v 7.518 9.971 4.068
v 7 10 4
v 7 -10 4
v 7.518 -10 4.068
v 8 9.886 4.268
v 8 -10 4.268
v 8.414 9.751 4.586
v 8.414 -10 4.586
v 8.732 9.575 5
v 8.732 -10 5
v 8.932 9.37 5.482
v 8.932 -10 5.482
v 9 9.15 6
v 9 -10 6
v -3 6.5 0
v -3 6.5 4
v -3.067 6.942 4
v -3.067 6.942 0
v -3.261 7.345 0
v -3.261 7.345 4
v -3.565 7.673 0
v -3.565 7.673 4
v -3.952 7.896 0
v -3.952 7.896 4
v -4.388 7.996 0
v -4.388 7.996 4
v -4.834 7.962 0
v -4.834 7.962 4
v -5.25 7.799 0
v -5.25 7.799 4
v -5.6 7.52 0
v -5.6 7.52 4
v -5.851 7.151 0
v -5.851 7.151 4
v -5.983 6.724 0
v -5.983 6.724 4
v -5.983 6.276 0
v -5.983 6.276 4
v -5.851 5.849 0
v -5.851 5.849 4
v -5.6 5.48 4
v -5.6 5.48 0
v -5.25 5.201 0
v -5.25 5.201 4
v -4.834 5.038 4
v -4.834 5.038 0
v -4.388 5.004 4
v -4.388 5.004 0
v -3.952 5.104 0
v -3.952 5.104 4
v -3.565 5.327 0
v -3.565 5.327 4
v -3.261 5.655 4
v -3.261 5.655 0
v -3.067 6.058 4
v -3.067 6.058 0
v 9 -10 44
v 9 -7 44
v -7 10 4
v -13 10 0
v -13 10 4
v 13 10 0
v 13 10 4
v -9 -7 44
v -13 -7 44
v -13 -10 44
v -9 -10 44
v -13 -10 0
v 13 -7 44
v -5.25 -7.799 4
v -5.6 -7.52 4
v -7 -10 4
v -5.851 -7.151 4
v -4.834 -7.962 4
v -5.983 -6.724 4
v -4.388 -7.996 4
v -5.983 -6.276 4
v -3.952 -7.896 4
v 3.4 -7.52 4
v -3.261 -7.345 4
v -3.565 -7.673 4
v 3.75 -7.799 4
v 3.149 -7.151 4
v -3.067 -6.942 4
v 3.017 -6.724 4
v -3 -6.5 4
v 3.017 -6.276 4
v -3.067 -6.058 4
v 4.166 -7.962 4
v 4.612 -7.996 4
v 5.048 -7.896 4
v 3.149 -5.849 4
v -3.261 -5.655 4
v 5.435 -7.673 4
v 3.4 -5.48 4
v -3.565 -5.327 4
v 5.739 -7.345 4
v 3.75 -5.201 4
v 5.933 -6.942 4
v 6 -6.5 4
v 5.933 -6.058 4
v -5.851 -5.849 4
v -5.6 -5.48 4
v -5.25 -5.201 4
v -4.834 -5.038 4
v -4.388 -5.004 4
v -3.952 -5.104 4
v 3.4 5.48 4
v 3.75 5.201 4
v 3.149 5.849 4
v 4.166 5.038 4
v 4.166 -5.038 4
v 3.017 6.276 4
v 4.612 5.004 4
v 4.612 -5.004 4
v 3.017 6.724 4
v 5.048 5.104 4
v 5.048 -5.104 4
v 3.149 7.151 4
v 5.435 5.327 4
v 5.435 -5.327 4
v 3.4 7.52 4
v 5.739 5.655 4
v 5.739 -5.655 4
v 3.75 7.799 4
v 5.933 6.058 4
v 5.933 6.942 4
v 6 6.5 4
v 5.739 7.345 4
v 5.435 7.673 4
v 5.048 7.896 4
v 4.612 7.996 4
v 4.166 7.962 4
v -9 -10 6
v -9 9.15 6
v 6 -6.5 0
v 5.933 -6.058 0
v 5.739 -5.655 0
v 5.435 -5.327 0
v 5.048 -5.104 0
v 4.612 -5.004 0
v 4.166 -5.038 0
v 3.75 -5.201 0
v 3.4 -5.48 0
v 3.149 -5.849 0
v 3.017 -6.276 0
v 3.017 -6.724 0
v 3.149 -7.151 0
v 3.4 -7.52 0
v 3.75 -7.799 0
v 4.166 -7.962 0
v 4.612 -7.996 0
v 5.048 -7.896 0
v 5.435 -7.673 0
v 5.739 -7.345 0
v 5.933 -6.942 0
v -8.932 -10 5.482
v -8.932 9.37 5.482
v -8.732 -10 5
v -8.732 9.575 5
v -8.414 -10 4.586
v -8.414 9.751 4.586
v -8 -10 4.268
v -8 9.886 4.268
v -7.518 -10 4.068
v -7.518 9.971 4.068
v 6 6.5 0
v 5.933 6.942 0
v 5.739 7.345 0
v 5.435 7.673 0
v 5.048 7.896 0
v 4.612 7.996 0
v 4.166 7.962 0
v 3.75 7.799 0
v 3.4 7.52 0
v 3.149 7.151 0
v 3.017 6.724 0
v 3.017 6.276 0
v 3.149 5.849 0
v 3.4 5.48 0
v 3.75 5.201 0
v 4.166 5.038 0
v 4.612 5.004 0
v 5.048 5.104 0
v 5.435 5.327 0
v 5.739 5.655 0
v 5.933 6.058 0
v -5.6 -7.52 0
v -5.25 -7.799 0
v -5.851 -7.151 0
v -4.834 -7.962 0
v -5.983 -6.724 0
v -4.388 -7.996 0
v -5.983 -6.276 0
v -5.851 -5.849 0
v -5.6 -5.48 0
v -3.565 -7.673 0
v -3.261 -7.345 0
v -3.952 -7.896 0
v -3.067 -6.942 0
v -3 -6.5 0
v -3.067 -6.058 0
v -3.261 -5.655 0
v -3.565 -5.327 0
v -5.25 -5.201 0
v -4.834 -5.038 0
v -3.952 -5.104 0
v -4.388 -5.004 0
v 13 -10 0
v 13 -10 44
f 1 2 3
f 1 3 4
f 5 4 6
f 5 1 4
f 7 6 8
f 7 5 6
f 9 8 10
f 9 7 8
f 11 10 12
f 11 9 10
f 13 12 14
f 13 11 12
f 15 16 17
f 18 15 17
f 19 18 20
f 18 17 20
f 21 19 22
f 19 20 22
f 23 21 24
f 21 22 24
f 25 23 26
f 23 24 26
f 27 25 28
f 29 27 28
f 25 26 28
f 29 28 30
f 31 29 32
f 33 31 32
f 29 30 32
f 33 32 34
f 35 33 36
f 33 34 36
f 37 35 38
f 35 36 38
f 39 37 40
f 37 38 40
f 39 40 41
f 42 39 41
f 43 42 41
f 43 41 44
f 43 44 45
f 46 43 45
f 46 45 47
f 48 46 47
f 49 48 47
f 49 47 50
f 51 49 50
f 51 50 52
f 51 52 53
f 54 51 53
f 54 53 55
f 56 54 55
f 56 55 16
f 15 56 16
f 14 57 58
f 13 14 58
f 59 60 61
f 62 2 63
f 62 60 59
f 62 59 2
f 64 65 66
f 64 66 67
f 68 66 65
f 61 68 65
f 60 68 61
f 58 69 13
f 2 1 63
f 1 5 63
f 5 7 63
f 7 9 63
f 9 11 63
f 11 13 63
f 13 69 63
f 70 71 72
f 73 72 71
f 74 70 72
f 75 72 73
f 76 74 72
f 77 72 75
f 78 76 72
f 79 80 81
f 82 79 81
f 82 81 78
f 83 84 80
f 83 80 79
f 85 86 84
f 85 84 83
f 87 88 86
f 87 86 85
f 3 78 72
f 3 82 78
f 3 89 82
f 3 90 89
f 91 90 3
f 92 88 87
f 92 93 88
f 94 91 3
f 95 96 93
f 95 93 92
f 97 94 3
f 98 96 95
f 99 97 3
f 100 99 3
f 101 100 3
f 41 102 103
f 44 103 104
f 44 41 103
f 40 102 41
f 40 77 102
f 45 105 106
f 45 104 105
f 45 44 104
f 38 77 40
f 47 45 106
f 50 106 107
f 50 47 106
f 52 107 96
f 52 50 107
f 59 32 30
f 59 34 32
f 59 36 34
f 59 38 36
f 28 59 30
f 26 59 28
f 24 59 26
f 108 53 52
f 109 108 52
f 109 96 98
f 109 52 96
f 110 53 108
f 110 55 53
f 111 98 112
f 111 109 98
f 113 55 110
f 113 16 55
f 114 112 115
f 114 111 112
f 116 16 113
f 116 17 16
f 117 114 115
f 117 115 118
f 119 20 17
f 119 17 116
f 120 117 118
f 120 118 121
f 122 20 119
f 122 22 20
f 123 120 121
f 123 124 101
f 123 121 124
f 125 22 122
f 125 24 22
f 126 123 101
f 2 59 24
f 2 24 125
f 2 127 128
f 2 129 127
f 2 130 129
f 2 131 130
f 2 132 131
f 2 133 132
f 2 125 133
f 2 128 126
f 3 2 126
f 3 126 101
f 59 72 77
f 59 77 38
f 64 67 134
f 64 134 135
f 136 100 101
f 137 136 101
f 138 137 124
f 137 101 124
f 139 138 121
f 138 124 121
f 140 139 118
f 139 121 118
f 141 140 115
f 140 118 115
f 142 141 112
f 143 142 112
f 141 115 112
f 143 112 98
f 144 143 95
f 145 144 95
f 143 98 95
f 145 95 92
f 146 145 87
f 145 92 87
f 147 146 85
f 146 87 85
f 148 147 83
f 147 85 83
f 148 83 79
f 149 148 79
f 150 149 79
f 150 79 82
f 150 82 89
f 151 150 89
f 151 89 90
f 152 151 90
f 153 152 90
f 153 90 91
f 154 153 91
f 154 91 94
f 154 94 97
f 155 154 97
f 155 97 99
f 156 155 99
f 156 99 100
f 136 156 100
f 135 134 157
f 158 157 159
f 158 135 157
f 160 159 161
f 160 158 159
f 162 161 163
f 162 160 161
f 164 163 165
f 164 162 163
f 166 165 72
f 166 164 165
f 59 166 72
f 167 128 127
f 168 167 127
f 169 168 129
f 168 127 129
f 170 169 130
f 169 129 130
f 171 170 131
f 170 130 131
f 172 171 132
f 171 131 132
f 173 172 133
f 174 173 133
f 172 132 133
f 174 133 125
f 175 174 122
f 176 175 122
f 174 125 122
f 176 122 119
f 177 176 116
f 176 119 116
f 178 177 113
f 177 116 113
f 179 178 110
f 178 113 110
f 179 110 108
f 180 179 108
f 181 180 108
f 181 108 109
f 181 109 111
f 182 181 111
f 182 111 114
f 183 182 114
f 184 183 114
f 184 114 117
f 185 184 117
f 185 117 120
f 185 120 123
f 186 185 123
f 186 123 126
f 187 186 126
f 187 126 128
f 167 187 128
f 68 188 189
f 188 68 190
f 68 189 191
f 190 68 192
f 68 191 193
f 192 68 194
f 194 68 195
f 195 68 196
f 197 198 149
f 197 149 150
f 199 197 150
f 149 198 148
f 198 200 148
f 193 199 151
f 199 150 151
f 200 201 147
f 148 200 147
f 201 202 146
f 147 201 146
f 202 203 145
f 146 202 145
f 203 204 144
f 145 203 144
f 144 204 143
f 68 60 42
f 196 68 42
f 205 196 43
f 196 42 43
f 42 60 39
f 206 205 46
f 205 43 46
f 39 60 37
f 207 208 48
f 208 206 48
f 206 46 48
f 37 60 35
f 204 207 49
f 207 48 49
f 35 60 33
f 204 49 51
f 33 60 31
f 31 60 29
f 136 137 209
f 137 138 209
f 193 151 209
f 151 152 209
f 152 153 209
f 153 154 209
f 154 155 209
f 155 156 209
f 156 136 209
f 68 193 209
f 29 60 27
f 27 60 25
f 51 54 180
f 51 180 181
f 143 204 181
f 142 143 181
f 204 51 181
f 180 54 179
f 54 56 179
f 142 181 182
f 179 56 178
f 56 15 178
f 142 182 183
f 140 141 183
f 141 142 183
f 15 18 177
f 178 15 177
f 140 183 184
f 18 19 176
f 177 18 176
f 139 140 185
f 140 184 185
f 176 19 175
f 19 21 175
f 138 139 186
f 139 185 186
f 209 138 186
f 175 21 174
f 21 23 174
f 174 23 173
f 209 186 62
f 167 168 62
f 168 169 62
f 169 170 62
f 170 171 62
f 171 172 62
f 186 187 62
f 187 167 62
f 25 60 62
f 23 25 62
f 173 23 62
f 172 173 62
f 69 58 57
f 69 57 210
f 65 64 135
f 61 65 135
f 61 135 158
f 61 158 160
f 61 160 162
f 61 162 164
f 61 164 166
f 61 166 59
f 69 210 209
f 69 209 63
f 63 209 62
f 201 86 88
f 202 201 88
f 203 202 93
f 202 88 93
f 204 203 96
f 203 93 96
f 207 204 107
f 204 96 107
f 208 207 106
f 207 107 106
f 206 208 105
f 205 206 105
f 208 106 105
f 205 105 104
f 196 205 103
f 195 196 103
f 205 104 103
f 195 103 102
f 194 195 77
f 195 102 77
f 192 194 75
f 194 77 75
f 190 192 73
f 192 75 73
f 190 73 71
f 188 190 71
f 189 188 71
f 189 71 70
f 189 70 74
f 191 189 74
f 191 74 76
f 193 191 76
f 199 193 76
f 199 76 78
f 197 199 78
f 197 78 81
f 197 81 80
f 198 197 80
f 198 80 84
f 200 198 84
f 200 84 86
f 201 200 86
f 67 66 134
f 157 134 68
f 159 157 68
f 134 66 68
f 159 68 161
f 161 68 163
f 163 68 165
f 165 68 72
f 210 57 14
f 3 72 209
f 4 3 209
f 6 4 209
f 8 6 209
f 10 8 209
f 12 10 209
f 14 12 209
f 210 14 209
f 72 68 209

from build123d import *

# Parameters (mm, degrees)
SKETCH_1_W          = 26
SKETCH_1_H          = 20
EXTRUDE_1_DEPTH     = 4
SKETCH_2_W          = 4
SKETCH_2_H          = 20
EXTRUDE_2_DEPTH     = 40
SKETCH_3_R          = 1.5
CUT_EXTRUDE_1_DEPTH = 30
CUT_EXTRUDE_2_DEPTH = 53.076866265
FILLET_1_R          = 2


with BuildPart() as part:
    # 草图1 → 凸台-拉伸1 (new body)
    with BuildSketch(Plane.XY):
        Rectangle(SKETCH_1_W, SKETCH_1_H)
    extrude(amount=EXTRUDE_1_DEPTH)

    # 草图2 → 凸台-拉伸2 (add)
    with BuildSketch(Plane.XY.offset(4)):
        with Locations((-11, 0)):
            Rectangle(SKETCH_2_W, SKETCH_2_H)
        with Locations((11, 0)):
            Rectangle(SKETCH_2_W, SKETCH_2_H)
    extrude(amount=EXTRUDE_2_DEPTH)

    # 草图3 → 切除-拉伸1 (cut)
    with BuildSketch(Plane.XY.offset(4)):
        with Locations((-4.5, 6.5)):
            Circle(SKETCH_3_R)
        with Locations((4.5, 6.5)):
            Circle(SKETCH_3_R)
        with Locations((4.5, -6.5)):
            Circle(SKETCH_3_R)
        with Locations((-4.5, -6.5)):
            Circle(SKETCH_3_R)
    extrude(amount=-CUT_EXTRUDE_1_DEPTH, mode=Mode.SUBTRACT)

    # 草图4 → 切除-拉伸2 (cut, through all)
    with BuildSketch(Plane(origin=(13, 0, 0), x_dir=(0, 0, -1), z_dir=(1, 0, 0))):
        Polygon((-44, -7), (-4, 10), (-44, 10), align=None)
    extrude(amount=-CUT_EXTRUDE_2_DEPTH, mode=Mode.SUBTRACT)

    # 圆角1
    fillet_1_edges = [part.edges().sort_by_distance(p)[0] for p in [
        (-9, 0, 4),
        (9, 0, 4),
    ]]
    fillet(fillet_1_edges, radius=FILLET_1_R)


solid = part.part
